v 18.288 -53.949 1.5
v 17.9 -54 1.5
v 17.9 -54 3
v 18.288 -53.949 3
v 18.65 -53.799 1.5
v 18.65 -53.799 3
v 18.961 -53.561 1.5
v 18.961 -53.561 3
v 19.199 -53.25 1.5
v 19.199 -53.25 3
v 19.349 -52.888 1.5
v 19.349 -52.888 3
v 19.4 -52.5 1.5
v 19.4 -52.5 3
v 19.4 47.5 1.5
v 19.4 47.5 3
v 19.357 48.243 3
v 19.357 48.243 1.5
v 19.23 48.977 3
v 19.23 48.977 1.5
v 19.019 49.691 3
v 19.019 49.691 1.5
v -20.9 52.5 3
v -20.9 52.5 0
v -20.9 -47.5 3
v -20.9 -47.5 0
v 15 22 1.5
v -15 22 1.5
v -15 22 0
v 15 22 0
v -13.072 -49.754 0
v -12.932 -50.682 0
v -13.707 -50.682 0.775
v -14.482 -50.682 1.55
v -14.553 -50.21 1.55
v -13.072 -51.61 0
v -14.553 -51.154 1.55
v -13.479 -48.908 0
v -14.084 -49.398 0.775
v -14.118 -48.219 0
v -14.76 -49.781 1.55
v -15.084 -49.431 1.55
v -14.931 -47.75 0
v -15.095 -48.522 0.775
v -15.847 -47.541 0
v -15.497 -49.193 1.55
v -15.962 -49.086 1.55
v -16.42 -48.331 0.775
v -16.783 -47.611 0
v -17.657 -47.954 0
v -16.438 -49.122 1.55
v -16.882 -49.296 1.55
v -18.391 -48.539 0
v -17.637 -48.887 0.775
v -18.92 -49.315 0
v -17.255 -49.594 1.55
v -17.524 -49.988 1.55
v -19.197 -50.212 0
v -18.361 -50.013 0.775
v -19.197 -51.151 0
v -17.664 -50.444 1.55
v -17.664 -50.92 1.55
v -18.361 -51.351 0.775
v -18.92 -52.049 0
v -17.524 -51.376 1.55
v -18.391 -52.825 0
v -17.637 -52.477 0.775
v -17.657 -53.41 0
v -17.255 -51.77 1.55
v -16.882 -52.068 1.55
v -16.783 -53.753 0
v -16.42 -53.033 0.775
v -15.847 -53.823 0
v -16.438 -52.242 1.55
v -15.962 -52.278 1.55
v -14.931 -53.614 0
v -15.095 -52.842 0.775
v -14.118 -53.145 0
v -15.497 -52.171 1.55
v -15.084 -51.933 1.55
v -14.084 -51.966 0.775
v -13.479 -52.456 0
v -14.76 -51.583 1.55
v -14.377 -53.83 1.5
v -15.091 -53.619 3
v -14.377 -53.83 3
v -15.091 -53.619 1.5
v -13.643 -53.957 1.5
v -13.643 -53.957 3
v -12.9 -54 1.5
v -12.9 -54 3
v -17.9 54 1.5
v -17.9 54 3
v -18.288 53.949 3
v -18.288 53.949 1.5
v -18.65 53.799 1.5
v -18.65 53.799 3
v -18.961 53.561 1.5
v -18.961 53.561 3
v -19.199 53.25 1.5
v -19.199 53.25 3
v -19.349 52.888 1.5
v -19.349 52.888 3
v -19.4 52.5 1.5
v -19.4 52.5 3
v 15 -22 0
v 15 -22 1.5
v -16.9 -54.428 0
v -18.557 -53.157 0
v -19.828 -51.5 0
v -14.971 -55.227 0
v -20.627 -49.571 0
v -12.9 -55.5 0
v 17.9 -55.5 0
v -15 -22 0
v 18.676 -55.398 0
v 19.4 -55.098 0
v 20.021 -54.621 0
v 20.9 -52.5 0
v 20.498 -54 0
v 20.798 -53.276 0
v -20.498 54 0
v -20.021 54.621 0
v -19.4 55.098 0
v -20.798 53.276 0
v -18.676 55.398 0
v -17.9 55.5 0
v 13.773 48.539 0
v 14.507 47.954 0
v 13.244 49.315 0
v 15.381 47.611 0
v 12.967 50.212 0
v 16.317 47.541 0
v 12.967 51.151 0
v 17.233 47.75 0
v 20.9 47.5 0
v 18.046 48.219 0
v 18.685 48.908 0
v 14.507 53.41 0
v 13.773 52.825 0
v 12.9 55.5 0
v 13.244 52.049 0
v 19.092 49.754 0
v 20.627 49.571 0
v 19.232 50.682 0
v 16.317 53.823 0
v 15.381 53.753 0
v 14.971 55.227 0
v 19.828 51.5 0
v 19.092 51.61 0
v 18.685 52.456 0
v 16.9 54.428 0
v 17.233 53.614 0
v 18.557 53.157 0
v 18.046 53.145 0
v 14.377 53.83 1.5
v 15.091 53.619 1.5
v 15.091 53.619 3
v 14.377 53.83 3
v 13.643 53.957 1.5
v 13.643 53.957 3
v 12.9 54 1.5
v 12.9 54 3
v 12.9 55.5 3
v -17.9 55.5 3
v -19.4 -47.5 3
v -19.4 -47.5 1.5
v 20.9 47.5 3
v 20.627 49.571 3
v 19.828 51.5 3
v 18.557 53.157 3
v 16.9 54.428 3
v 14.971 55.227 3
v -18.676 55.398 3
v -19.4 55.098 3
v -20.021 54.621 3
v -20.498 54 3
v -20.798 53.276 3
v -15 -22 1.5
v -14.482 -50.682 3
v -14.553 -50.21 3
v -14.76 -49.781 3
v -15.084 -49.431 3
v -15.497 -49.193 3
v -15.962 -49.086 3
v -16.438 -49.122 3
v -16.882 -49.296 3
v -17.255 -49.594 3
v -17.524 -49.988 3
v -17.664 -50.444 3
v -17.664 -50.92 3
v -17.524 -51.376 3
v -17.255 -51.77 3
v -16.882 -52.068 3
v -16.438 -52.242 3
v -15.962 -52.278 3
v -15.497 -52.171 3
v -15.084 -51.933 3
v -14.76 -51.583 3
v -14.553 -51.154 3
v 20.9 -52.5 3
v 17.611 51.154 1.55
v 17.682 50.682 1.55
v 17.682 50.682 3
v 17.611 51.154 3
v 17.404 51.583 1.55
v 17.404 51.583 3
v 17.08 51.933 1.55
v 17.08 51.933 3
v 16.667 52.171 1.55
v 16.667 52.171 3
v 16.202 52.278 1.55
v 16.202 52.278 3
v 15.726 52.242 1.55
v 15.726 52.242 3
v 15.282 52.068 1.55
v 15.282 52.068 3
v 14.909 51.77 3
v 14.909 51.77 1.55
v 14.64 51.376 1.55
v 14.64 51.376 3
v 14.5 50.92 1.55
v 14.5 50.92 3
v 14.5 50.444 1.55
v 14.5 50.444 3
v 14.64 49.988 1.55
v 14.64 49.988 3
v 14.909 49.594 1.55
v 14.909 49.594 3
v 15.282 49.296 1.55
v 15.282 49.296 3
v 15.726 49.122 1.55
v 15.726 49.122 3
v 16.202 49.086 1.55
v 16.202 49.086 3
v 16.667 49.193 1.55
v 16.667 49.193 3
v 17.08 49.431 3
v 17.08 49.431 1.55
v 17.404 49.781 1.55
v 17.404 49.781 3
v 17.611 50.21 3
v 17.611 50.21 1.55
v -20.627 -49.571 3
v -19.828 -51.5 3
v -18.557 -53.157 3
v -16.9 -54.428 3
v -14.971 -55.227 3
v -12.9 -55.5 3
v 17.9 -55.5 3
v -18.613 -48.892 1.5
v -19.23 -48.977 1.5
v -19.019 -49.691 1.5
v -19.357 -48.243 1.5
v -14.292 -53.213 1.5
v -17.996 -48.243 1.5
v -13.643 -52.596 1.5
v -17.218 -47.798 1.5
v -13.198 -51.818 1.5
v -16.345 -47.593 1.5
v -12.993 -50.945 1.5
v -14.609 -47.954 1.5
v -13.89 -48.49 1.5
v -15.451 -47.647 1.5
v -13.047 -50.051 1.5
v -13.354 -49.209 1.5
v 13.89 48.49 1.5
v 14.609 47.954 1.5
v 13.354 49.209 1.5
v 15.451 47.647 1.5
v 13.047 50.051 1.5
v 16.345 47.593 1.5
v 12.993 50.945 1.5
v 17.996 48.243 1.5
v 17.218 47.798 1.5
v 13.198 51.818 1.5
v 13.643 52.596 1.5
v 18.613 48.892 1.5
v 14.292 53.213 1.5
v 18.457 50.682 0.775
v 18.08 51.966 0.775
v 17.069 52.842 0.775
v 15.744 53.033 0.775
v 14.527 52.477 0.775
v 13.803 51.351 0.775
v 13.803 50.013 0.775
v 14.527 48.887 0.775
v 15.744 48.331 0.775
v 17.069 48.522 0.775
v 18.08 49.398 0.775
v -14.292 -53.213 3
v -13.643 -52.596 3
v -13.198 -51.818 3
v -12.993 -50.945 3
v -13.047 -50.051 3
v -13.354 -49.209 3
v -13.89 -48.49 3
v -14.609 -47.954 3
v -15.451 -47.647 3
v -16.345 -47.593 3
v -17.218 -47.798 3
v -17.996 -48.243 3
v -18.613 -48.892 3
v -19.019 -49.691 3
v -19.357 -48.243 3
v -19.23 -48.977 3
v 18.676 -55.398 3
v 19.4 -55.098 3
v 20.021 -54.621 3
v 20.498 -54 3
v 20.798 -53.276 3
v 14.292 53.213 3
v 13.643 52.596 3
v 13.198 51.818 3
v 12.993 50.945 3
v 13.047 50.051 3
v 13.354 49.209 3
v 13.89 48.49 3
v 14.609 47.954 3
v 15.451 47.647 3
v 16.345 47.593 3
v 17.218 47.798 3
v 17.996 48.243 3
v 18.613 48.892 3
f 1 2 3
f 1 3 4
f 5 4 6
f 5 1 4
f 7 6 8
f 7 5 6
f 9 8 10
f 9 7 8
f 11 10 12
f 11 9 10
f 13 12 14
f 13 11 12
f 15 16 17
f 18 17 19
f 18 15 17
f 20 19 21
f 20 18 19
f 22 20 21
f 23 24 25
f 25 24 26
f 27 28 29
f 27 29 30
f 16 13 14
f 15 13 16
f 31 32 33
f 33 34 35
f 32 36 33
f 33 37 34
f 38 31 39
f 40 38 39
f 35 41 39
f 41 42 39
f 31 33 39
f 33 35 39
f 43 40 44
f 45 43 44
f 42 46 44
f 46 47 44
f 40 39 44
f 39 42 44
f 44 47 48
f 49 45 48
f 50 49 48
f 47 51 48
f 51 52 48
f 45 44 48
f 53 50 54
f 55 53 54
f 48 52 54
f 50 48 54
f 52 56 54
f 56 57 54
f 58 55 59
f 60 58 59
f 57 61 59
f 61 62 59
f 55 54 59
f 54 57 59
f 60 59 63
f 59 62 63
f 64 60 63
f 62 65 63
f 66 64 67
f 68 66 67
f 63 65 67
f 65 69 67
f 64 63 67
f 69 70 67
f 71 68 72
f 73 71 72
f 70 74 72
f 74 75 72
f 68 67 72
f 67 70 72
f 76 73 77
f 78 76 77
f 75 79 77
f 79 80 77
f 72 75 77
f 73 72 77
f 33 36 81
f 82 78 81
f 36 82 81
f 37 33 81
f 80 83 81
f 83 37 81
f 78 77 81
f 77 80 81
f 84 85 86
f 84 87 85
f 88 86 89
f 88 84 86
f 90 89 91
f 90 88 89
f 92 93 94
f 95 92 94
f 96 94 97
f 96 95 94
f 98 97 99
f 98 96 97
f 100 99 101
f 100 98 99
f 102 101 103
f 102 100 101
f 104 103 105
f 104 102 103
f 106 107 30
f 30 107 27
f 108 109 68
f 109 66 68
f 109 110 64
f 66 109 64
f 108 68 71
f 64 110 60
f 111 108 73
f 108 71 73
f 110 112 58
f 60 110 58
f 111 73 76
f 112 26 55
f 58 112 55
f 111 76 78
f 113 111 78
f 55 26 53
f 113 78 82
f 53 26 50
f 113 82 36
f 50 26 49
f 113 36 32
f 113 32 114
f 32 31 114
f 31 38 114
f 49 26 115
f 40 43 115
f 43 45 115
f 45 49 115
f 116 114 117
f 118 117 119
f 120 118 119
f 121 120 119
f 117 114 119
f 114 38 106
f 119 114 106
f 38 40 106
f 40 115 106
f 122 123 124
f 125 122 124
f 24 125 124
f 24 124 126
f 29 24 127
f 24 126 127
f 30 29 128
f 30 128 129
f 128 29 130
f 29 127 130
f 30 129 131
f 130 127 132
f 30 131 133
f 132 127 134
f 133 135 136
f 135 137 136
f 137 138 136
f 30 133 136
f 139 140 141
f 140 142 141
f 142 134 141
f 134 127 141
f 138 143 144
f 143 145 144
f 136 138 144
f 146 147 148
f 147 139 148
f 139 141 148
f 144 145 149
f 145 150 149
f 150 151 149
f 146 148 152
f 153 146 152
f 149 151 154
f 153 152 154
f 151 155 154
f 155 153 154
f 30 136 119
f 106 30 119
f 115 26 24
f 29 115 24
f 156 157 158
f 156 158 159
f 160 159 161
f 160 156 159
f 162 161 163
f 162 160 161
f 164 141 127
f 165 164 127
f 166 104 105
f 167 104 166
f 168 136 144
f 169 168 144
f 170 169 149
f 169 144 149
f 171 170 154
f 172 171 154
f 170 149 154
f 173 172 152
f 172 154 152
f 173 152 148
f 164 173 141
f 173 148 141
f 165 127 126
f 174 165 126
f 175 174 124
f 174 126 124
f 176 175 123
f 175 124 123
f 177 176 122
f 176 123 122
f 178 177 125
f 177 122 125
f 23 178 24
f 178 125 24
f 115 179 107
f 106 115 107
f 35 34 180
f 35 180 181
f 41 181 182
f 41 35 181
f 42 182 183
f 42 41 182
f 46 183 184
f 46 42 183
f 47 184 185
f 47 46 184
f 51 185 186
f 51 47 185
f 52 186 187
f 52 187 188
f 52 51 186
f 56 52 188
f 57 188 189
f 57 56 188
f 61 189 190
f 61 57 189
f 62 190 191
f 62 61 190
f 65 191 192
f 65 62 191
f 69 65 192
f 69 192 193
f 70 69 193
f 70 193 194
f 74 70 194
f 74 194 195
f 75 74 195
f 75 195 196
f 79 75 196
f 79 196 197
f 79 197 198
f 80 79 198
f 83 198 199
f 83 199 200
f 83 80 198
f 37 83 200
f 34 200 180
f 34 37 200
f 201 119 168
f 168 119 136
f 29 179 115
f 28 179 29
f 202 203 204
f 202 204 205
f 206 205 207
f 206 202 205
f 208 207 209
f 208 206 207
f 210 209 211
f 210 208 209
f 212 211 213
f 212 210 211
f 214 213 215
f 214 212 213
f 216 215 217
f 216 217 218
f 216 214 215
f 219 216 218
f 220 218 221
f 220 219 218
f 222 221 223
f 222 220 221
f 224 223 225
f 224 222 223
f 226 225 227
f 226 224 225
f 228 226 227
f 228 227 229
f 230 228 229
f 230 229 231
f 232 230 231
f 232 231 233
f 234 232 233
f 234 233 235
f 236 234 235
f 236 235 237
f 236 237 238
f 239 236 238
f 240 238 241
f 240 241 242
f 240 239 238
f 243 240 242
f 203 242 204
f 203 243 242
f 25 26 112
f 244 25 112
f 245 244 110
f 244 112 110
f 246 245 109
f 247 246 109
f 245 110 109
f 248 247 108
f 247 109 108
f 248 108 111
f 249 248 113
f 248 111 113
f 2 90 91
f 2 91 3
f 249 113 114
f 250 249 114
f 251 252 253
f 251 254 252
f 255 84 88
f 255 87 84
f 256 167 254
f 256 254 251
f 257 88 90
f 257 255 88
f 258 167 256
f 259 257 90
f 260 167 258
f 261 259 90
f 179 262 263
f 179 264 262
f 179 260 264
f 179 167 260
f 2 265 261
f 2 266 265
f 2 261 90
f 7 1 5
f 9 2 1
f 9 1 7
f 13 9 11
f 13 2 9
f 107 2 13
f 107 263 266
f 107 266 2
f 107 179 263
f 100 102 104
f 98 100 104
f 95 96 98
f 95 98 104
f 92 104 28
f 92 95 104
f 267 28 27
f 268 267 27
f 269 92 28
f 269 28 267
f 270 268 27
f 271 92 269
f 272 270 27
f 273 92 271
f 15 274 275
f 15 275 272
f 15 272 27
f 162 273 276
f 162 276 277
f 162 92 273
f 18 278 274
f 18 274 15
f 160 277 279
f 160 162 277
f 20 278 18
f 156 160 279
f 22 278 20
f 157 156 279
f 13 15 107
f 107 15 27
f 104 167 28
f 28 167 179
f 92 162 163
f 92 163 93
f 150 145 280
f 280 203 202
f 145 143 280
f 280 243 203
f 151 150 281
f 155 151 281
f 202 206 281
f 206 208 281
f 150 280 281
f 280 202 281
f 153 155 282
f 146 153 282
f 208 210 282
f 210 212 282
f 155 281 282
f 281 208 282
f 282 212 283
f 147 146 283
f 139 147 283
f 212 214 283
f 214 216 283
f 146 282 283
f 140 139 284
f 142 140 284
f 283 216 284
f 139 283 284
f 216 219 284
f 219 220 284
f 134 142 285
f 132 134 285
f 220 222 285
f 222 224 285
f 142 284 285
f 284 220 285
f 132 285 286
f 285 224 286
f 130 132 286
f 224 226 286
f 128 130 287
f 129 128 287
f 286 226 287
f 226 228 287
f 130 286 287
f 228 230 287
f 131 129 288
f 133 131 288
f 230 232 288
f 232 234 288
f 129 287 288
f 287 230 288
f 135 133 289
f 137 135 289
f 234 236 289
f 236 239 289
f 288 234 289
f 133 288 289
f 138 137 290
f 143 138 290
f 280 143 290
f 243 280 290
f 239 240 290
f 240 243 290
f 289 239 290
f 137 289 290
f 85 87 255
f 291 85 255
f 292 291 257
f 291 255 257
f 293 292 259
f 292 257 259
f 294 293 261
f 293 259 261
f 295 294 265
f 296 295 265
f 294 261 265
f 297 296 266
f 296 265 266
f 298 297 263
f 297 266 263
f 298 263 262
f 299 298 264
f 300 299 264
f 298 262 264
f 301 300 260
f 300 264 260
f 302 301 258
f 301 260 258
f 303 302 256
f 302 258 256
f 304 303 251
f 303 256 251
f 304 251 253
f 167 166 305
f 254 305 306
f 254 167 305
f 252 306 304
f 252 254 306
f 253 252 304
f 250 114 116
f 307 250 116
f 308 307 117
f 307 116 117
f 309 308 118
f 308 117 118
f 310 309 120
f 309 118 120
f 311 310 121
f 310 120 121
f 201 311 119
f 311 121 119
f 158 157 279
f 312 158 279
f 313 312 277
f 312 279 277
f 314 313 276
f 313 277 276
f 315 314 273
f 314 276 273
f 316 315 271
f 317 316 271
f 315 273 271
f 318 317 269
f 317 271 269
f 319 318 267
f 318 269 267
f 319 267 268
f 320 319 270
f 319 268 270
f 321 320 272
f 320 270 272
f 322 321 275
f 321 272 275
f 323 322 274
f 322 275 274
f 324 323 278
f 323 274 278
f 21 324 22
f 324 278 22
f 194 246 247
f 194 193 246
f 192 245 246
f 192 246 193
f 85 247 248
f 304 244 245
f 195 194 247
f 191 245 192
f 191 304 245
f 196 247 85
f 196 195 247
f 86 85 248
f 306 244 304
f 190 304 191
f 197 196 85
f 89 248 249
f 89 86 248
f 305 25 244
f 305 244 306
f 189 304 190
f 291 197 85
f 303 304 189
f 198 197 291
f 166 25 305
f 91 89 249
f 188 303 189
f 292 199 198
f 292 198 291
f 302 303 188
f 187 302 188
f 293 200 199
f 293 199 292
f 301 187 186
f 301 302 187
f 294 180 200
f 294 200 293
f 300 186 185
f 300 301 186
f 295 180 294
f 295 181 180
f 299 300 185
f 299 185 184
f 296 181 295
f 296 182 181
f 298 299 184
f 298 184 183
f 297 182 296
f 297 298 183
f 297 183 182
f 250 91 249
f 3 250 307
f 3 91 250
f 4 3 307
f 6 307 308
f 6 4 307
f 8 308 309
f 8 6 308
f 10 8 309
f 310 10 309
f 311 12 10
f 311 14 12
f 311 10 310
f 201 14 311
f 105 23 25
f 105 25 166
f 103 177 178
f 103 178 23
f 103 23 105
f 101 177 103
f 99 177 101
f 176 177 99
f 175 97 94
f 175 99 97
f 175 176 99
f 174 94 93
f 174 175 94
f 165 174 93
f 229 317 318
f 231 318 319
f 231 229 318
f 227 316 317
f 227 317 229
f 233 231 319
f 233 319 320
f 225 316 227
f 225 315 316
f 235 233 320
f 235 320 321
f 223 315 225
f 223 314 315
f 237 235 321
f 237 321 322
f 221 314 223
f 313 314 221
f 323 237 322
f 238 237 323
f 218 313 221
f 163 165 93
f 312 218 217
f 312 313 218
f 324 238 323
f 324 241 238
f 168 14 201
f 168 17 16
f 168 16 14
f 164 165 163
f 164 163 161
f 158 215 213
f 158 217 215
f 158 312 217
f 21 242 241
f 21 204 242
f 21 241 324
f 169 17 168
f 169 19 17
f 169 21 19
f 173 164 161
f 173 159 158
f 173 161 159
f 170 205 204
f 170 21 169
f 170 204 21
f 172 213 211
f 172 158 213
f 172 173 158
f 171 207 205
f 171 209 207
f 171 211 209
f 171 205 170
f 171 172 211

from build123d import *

# Parameters (mm, degrees)
F0_R     = 1.6
F1_DEPTH = 3
F2_T     = -1.5
F3_W     = 30
F3_H     = 44
F4_DEPTH = 1.501
F5_SIZE  = 1.55


with BuildPart() as f1:
    # F0 (on Top) → F1 (new body)
    with BuildSketch(Plane.XY):
        with BuildLine():
            Line((-12.9, -55.5), (17.9, -55.5))
            ThreePointArc((17.9, -55.5), (20.02132, -54.62132), (20.9, -52.5))
            Line((20.9, -52.5), (20.9, 47.5))
            ThreePointArc((20.9, 47.5), (18.556854, 53.156854), (12.9, 55.5))
            Line((12.9, 55.5), (-17.9, 55.5))
            ThreePointArc((-17.9, 55.5), (-20.02132, 54.62132), (-20.9, 52.5))
            Line((-20.9, 52.5), (-20.9, -47.5))
            ThreePointArc((-20.9, -47.5), (-18.556854, -53.156854), (-12.9, -55.5))
        make_face()
        with Locations((-16.081981, -50.681981)):
            Circle(F0_R, mode=Mode.SUBTRACT)
        with Locations((16.081981, 50.681981)):
            Circle(F0_R, mode=Mode.SUBTRACT)
    extrude(amount=F1_DEPTH)

    # F2
    f2_openings = [f1.faces().sort_by_distance(p)[0] for p in [
        (0, 0, 3),
    ]]
    offset(amount=F2_T, openings=f2_openings)

    # F3 (on face) → F4 (cut, through all)
    with BuildSketch(Plane.XY.offset(1.5)):
        Rectangle(F3_W, F3_H)
    extrude(amount=-F4_DEPTH, mode=Mode.SUBTRACT)

    # F5
    f5_edges = [f1.edges().sort_by_distance(p)[0] for p in [
        (14.481981, 50.681981, 0),
        (-17.681981, -50.681981, 0),
    ]]
    chamfer(f5_edges, length=F5_SIZE)


solid = f1.part
